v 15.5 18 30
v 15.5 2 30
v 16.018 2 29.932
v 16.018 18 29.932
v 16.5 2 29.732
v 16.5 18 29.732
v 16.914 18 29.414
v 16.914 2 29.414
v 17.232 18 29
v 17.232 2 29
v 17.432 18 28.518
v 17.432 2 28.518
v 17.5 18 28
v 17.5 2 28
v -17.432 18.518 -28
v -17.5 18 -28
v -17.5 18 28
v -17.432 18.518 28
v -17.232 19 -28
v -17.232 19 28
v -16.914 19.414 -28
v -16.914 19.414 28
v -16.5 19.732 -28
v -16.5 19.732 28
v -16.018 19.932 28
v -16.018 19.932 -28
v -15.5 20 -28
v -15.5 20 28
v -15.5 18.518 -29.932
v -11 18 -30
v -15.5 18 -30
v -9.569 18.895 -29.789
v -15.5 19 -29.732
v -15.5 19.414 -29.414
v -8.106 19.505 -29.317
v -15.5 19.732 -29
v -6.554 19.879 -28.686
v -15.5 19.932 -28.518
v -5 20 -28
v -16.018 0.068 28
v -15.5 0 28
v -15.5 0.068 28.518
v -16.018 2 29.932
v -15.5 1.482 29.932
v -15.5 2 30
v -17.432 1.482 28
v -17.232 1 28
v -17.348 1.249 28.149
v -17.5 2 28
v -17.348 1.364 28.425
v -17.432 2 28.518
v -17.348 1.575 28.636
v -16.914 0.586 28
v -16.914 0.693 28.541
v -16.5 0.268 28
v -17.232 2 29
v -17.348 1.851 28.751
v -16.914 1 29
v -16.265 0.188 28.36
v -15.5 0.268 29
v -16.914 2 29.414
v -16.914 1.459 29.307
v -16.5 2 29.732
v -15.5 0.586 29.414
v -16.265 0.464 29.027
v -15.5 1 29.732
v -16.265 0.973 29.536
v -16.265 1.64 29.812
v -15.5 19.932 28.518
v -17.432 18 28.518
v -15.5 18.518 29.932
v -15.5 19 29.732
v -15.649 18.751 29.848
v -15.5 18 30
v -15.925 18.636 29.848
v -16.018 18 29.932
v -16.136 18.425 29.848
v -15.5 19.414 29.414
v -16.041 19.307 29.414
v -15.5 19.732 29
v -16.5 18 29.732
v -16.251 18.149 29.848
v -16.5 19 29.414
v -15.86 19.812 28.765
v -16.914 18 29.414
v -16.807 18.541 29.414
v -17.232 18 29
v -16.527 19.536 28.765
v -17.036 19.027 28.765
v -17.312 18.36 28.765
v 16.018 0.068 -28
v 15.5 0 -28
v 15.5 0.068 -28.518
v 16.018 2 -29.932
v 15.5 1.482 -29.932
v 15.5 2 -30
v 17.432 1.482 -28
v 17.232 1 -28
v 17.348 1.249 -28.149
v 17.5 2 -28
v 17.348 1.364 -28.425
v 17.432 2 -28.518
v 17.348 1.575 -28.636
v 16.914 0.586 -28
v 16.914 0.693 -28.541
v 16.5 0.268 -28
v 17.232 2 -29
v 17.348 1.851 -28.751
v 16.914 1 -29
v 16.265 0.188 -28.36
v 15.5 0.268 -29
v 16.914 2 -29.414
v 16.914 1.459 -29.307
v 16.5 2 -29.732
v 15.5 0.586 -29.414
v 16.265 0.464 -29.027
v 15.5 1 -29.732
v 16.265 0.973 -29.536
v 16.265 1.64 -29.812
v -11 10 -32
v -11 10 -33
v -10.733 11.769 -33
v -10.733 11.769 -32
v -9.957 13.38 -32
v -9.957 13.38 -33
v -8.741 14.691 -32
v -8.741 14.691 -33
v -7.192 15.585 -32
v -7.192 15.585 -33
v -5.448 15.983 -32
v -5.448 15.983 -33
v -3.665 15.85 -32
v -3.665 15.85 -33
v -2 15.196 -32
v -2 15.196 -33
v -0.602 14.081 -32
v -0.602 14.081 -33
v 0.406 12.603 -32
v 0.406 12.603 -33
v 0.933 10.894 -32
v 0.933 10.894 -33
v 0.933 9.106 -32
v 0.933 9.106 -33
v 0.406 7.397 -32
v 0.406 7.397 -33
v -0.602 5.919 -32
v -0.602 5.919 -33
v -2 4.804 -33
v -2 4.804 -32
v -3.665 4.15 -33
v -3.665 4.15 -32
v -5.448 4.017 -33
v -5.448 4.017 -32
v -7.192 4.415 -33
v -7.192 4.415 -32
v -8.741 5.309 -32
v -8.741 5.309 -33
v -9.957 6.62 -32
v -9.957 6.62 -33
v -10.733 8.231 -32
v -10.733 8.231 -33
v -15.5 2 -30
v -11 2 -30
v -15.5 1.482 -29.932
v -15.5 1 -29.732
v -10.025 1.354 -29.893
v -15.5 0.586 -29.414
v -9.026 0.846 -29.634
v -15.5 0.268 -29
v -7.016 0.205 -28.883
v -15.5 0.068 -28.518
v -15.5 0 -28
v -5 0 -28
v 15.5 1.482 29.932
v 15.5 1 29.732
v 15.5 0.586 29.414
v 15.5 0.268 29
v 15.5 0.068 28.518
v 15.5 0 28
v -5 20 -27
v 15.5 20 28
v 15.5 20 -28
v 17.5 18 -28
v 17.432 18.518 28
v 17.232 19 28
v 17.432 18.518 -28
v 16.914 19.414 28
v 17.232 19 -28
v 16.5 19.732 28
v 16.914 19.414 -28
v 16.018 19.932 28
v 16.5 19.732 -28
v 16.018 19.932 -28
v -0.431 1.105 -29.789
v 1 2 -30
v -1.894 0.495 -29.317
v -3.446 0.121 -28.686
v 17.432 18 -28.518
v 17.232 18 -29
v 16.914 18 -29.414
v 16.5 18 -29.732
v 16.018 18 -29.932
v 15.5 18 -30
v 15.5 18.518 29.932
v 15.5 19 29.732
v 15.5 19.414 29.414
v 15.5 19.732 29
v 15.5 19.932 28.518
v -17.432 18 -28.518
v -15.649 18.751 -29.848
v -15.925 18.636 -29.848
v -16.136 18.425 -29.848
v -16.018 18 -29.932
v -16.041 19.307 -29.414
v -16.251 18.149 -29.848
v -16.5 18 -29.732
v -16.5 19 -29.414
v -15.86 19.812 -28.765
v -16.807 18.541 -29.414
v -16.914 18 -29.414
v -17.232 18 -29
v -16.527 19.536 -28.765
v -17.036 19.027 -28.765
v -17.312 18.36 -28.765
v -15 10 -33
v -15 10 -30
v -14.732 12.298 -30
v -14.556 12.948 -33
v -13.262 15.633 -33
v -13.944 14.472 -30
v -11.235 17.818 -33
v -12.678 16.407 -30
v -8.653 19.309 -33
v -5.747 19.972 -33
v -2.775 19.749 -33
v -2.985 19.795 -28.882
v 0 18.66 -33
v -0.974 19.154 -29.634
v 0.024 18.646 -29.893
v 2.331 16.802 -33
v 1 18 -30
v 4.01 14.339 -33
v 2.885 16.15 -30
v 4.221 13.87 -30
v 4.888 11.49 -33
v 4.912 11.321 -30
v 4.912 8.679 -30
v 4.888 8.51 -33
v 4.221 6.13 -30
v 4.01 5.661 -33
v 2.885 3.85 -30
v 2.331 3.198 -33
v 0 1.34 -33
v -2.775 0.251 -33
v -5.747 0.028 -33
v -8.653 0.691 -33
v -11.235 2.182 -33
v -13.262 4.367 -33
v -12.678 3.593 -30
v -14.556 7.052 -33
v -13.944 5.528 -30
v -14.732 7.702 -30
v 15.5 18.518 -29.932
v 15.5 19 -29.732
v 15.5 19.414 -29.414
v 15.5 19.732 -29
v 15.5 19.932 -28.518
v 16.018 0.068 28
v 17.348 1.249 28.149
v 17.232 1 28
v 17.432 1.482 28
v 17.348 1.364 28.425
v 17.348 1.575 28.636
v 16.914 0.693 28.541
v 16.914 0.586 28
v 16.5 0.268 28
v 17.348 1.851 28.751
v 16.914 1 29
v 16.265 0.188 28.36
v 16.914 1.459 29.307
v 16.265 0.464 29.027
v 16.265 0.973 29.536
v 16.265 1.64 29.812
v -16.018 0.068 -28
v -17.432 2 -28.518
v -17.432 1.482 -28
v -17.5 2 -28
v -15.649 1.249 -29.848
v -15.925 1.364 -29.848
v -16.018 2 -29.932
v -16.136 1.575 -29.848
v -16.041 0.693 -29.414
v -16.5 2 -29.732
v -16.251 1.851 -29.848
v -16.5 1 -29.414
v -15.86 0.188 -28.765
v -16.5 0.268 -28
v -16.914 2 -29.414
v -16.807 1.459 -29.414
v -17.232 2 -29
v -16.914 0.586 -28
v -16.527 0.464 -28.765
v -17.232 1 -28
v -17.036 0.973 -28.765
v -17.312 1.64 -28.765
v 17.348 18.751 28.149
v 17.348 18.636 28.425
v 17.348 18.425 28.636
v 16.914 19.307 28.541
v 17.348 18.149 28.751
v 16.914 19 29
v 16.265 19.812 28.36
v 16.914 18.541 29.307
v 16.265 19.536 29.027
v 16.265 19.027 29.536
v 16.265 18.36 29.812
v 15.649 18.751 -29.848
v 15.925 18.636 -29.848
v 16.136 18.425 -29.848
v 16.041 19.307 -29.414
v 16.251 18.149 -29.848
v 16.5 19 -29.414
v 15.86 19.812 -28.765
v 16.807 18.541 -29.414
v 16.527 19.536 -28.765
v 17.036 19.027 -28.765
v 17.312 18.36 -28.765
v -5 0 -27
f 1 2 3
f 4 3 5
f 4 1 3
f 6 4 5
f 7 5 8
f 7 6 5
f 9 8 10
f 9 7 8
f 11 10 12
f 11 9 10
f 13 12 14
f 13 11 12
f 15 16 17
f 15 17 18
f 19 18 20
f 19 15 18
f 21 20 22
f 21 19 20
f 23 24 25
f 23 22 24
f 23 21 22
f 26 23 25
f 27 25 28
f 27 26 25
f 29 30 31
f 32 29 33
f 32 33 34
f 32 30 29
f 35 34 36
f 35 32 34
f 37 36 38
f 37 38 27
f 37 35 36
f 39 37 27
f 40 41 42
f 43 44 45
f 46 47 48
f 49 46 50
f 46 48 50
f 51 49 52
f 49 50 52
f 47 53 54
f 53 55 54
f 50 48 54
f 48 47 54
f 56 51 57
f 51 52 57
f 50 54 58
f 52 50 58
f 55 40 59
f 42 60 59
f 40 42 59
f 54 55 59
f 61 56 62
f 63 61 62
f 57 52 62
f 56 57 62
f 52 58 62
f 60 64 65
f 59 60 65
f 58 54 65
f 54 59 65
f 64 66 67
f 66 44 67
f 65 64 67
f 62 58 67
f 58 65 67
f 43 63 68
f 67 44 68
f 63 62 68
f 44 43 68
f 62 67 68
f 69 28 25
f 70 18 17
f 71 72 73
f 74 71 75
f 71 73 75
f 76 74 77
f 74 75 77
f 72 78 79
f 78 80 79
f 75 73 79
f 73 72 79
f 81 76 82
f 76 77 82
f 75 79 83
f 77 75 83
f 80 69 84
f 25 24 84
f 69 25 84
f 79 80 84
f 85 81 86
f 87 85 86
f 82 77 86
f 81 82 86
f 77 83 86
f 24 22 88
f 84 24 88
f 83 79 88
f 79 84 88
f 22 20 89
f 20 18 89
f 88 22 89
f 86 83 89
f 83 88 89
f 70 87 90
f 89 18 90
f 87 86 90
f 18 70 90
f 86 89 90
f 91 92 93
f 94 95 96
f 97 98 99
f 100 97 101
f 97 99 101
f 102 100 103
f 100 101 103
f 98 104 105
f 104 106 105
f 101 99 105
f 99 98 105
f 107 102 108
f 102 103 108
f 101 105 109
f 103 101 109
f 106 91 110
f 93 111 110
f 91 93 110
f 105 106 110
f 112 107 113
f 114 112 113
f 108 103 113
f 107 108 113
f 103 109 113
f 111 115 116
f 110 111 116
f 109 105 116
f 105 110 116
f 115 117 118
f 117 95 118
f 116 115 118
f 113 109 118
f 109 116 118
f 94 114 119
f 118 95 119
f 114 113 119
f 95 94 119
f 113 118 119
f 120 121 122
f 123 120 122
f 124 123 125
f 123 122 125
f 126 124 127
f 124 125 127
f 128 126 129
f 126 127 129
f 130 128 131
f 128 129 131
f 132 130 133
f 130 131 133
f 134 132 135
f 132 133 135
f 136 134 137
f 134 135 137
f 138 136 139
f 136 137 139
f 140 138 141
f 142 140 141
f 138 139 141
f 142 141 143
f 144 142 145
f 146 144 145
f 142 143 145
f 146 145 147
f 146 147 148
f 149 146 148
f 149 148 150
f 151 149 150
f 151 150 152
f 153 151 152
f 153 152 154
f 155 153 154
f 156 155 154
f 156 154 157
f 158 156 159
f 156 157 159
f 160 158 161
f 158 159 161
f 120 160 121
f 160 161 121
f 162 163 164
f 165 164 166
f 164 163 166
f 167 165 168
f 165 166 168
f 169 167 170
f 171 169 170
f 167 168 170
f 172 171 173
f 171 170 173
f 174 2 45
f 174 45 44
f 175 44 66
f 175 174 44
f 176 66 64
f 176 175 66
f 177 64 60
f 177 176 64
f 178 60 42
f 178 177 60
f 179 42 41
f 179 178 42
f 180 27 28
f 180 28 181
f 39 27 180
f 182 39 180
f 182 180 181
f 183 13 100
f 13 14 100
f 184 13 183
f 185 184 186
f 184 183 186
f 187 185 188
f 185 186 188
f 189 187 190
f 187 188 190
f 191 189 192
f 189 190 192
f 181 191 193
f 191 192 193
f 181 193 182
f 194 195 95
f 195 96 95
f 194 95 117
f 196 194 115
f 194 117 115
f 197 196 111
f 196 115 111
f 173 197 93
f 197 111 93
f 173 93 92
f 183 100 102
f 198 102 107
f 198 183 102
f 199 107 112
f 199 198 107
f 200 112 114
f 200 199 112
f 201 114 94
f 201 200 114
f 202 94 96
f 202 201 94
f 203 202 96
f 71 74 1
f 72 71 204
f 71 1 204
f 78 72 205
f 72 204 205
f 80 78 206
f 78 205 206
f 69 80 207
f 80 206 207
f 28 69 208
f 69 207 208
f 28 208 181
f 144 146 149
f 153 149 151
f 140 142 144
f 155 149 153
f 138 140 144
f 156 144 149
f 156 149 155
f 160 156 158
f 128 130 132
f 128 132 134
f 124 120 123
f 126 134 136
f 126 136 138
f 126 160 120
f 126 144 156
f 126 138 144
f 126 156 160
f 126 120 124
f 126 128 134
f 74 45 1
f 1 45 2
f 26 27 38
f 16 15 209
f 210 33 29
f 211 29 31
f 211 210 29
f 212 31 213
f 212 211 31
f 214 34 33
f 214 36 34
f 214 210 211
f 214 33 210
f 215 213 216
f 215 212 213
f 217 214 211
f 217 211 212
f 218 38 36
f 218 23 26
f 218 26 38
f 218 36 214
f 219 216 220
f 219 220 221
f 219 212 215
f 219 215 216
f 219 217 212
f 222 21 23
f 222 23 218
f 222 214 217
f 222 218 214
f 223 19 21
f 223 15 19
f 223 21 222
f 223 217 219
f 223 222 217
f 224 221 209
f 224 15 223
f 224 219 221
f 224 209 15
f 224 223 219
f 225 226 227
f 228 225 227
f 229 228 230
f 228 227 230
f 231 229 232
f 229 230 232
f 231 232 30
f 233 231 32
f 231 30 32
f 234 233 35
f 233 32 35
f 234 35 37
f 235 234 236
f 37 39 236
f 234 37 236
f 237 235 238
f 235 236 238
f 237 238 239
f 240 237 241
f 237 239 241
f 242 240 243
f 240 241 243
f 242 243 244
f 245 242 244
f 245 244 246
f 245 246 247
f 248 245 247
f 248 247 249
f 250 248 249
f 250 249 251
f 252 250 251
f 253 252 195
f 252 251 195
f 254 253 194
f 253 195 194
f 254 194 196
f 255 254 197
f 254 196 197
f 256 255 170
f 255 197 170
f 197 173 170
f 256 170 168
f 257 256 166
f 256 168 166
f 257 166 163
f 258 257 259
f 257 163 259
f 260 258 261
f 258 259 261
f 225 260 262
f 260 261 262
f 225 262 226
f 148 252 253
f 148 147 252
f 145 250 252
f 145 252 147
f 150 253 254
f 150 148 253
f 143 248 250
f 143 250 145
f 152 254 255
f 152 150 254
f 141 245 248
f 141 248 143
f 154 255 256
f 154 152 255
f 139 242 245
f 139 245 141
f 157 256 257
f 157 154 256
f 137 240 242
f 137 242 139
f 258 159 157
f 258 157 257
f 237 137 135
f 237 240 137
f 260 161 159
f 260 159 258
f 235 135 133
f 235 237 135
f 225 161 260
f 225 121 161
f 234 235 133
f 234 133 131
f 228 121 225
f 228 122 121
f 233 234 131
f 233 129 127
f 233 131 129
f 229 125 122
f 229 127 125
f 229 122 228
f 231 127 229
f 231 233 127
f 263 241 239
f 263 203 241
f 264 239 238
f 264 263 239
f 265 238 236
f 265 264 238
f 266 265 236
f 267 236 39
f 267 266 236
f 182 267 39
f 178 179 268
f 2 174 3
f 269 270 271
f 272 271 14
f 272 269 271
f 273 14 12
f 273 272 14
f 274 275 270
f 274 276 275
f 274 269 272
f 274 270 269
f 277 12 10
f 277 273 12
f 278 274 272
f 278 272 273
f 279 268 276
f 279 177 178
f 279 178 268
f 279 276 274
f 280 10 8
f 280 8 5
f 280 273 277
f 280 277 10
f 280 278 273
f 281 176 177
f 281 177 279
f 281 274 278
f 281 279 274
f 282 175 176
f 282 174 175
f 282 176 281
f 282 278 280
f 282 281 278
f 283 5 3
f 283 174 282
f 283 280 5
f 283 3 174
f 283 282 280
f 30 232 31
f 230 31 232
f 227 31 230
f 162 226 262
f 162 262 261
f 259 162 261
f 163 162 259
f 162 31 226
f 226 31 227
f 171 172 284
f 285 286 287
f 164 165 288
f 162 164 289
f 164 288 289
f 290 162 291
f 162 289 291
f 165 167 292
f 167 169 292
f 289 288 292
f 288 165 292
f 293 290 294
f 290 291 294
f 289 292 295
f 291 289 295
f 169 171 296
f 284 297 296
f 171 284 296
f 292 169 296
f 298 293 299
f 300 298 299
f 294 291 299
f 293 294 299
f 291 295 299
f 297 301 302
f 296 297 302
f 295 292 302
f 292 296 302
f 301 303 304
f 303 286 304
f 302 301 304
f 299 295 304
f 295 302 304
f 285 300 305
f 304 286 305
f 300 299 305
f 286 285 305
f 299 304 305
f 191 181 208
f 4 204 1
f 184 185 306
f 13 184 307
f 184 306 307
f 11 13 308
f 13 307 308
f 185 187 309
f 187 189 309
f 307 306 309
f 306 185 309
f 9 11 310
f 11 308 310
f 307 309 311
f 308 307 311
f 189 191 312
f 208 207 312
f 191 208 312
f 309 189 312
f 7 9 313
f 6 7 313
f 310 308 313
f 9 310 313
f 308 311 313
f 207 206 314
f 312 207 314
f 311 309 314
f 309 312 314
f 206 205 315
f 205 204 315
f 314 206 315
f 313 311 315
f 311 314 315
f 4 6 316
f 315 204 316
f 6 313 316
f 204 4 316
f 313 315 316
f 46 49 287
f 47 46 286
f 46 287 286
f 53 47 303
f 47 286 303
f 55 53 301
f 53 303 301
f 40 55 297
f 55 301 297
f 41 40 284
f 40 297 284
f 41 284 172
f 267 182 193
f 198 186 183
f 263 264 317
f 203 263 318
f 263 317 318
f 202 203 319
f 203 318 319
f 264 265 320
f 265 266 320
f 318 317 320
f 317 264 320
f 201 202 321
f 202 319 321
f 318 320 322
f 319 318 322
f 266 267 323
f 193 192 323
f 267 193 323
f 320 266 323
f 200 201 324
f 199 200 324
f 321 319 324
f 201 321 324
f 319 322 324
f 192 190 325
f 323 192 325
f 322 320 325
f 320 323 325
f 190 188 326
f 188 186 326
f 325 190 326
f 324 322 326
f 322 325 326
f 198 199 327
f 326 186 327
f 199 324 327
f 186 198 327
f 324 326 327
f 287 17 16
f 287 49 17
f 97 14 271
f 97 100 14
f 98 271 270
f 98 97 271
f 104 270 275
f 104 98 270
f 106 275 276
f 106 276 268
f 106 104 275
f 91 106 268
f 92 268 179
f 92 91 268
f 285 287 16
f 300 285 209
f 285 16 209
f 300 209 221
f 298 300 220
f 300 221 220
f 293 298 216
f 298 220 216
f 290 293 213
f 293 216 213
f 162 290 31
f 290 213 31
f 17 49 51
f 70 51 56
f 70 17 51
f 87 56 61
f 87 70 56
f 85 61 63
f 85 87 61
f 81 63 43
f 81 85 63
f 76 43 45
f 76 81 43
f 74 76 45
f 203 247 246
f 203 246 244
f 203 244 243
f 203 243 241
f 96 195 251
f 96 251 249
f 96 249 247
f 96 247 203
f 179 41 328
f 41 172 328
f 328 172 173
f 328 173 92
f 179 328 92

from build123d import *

# Parameters (mm, degrees)
SKETCH1_W                = 35
SKETCH1_H                = 60
BOSS_EXTRUDE1_DEPTH      = 20
FILLET1_R                = 2
BOSS_EXTRUDE2_DEPTH      = 3
BOSS_EXTRUDE2_DEPTH_BACK = 3
SKETCH2_R                = 10
SKETCH3_R                = 6
CUT_EXTRUDE1_DEPTH       = 1


with BuildPart() as part:
    # Sketch1 → Boss-Extrude1 (new body)
    with BuildSketch(Plane(origin=(0, 0, 0), x_dir=(1, 0, 0), z_dir=(0, 1, 0))):
        Rectangle(SKETCH1_W, SKETCH1_H)
    extrude(amount=BOSS_EXTRUDE1_DEPTH)

    # Fillet1
    fillet1_edges = [part.edges().sort_by_distance(p)[0] for p in [
        (-17.5, 20, 0),
        (0, 20, 30),
        (17.5, 20, 0),
        (0, 0, 30),
        (-17.5, 0, 0),
        (0, 0, -30),
        (17.5, 0, 0),
        (0, 20, -30),
        (17.5, 10, 30),
        (-17.5, 10, 30),
        (-17.5, 10, -30),
        (17.5, 10, -30),
    ]]
    fillet(fillet1_edges, radius=FILLET1_R)

    # Sketch2 → Boss-Extrude2 (add, two sides: drawn at the far end of the back side and taken through both)
    with BuildSketch(Plane(origin=(0, 0, -30), x_dir=(-1, 0, 0), z_dir=(0, 0, -1)).offset(-BOSS_EXTRUDE2_DEPTH_BACK)):
        with Locations((5, 10)):
            Circle(SKETCH2_R)
    extrude(amount=BOSS_EXTRUDE2_DEPTH + BOSS_EXTRUDE2_DEPTH_BACK)

    # Sketch3 → Cut-Extrude1 (cut)
    with BuildSketch(Plane(origin=(0, 0, -33), x_dir=(-1, 0, 0), z_dir=(0, 0, -1))):
        with Locations((5, 10)):
            Circle(SKETCH3_R)
    extrude(amount=-CUT_EXTRUDE1_DEPTH, mode=Mode.SUBTRACT)


solid = part.part
